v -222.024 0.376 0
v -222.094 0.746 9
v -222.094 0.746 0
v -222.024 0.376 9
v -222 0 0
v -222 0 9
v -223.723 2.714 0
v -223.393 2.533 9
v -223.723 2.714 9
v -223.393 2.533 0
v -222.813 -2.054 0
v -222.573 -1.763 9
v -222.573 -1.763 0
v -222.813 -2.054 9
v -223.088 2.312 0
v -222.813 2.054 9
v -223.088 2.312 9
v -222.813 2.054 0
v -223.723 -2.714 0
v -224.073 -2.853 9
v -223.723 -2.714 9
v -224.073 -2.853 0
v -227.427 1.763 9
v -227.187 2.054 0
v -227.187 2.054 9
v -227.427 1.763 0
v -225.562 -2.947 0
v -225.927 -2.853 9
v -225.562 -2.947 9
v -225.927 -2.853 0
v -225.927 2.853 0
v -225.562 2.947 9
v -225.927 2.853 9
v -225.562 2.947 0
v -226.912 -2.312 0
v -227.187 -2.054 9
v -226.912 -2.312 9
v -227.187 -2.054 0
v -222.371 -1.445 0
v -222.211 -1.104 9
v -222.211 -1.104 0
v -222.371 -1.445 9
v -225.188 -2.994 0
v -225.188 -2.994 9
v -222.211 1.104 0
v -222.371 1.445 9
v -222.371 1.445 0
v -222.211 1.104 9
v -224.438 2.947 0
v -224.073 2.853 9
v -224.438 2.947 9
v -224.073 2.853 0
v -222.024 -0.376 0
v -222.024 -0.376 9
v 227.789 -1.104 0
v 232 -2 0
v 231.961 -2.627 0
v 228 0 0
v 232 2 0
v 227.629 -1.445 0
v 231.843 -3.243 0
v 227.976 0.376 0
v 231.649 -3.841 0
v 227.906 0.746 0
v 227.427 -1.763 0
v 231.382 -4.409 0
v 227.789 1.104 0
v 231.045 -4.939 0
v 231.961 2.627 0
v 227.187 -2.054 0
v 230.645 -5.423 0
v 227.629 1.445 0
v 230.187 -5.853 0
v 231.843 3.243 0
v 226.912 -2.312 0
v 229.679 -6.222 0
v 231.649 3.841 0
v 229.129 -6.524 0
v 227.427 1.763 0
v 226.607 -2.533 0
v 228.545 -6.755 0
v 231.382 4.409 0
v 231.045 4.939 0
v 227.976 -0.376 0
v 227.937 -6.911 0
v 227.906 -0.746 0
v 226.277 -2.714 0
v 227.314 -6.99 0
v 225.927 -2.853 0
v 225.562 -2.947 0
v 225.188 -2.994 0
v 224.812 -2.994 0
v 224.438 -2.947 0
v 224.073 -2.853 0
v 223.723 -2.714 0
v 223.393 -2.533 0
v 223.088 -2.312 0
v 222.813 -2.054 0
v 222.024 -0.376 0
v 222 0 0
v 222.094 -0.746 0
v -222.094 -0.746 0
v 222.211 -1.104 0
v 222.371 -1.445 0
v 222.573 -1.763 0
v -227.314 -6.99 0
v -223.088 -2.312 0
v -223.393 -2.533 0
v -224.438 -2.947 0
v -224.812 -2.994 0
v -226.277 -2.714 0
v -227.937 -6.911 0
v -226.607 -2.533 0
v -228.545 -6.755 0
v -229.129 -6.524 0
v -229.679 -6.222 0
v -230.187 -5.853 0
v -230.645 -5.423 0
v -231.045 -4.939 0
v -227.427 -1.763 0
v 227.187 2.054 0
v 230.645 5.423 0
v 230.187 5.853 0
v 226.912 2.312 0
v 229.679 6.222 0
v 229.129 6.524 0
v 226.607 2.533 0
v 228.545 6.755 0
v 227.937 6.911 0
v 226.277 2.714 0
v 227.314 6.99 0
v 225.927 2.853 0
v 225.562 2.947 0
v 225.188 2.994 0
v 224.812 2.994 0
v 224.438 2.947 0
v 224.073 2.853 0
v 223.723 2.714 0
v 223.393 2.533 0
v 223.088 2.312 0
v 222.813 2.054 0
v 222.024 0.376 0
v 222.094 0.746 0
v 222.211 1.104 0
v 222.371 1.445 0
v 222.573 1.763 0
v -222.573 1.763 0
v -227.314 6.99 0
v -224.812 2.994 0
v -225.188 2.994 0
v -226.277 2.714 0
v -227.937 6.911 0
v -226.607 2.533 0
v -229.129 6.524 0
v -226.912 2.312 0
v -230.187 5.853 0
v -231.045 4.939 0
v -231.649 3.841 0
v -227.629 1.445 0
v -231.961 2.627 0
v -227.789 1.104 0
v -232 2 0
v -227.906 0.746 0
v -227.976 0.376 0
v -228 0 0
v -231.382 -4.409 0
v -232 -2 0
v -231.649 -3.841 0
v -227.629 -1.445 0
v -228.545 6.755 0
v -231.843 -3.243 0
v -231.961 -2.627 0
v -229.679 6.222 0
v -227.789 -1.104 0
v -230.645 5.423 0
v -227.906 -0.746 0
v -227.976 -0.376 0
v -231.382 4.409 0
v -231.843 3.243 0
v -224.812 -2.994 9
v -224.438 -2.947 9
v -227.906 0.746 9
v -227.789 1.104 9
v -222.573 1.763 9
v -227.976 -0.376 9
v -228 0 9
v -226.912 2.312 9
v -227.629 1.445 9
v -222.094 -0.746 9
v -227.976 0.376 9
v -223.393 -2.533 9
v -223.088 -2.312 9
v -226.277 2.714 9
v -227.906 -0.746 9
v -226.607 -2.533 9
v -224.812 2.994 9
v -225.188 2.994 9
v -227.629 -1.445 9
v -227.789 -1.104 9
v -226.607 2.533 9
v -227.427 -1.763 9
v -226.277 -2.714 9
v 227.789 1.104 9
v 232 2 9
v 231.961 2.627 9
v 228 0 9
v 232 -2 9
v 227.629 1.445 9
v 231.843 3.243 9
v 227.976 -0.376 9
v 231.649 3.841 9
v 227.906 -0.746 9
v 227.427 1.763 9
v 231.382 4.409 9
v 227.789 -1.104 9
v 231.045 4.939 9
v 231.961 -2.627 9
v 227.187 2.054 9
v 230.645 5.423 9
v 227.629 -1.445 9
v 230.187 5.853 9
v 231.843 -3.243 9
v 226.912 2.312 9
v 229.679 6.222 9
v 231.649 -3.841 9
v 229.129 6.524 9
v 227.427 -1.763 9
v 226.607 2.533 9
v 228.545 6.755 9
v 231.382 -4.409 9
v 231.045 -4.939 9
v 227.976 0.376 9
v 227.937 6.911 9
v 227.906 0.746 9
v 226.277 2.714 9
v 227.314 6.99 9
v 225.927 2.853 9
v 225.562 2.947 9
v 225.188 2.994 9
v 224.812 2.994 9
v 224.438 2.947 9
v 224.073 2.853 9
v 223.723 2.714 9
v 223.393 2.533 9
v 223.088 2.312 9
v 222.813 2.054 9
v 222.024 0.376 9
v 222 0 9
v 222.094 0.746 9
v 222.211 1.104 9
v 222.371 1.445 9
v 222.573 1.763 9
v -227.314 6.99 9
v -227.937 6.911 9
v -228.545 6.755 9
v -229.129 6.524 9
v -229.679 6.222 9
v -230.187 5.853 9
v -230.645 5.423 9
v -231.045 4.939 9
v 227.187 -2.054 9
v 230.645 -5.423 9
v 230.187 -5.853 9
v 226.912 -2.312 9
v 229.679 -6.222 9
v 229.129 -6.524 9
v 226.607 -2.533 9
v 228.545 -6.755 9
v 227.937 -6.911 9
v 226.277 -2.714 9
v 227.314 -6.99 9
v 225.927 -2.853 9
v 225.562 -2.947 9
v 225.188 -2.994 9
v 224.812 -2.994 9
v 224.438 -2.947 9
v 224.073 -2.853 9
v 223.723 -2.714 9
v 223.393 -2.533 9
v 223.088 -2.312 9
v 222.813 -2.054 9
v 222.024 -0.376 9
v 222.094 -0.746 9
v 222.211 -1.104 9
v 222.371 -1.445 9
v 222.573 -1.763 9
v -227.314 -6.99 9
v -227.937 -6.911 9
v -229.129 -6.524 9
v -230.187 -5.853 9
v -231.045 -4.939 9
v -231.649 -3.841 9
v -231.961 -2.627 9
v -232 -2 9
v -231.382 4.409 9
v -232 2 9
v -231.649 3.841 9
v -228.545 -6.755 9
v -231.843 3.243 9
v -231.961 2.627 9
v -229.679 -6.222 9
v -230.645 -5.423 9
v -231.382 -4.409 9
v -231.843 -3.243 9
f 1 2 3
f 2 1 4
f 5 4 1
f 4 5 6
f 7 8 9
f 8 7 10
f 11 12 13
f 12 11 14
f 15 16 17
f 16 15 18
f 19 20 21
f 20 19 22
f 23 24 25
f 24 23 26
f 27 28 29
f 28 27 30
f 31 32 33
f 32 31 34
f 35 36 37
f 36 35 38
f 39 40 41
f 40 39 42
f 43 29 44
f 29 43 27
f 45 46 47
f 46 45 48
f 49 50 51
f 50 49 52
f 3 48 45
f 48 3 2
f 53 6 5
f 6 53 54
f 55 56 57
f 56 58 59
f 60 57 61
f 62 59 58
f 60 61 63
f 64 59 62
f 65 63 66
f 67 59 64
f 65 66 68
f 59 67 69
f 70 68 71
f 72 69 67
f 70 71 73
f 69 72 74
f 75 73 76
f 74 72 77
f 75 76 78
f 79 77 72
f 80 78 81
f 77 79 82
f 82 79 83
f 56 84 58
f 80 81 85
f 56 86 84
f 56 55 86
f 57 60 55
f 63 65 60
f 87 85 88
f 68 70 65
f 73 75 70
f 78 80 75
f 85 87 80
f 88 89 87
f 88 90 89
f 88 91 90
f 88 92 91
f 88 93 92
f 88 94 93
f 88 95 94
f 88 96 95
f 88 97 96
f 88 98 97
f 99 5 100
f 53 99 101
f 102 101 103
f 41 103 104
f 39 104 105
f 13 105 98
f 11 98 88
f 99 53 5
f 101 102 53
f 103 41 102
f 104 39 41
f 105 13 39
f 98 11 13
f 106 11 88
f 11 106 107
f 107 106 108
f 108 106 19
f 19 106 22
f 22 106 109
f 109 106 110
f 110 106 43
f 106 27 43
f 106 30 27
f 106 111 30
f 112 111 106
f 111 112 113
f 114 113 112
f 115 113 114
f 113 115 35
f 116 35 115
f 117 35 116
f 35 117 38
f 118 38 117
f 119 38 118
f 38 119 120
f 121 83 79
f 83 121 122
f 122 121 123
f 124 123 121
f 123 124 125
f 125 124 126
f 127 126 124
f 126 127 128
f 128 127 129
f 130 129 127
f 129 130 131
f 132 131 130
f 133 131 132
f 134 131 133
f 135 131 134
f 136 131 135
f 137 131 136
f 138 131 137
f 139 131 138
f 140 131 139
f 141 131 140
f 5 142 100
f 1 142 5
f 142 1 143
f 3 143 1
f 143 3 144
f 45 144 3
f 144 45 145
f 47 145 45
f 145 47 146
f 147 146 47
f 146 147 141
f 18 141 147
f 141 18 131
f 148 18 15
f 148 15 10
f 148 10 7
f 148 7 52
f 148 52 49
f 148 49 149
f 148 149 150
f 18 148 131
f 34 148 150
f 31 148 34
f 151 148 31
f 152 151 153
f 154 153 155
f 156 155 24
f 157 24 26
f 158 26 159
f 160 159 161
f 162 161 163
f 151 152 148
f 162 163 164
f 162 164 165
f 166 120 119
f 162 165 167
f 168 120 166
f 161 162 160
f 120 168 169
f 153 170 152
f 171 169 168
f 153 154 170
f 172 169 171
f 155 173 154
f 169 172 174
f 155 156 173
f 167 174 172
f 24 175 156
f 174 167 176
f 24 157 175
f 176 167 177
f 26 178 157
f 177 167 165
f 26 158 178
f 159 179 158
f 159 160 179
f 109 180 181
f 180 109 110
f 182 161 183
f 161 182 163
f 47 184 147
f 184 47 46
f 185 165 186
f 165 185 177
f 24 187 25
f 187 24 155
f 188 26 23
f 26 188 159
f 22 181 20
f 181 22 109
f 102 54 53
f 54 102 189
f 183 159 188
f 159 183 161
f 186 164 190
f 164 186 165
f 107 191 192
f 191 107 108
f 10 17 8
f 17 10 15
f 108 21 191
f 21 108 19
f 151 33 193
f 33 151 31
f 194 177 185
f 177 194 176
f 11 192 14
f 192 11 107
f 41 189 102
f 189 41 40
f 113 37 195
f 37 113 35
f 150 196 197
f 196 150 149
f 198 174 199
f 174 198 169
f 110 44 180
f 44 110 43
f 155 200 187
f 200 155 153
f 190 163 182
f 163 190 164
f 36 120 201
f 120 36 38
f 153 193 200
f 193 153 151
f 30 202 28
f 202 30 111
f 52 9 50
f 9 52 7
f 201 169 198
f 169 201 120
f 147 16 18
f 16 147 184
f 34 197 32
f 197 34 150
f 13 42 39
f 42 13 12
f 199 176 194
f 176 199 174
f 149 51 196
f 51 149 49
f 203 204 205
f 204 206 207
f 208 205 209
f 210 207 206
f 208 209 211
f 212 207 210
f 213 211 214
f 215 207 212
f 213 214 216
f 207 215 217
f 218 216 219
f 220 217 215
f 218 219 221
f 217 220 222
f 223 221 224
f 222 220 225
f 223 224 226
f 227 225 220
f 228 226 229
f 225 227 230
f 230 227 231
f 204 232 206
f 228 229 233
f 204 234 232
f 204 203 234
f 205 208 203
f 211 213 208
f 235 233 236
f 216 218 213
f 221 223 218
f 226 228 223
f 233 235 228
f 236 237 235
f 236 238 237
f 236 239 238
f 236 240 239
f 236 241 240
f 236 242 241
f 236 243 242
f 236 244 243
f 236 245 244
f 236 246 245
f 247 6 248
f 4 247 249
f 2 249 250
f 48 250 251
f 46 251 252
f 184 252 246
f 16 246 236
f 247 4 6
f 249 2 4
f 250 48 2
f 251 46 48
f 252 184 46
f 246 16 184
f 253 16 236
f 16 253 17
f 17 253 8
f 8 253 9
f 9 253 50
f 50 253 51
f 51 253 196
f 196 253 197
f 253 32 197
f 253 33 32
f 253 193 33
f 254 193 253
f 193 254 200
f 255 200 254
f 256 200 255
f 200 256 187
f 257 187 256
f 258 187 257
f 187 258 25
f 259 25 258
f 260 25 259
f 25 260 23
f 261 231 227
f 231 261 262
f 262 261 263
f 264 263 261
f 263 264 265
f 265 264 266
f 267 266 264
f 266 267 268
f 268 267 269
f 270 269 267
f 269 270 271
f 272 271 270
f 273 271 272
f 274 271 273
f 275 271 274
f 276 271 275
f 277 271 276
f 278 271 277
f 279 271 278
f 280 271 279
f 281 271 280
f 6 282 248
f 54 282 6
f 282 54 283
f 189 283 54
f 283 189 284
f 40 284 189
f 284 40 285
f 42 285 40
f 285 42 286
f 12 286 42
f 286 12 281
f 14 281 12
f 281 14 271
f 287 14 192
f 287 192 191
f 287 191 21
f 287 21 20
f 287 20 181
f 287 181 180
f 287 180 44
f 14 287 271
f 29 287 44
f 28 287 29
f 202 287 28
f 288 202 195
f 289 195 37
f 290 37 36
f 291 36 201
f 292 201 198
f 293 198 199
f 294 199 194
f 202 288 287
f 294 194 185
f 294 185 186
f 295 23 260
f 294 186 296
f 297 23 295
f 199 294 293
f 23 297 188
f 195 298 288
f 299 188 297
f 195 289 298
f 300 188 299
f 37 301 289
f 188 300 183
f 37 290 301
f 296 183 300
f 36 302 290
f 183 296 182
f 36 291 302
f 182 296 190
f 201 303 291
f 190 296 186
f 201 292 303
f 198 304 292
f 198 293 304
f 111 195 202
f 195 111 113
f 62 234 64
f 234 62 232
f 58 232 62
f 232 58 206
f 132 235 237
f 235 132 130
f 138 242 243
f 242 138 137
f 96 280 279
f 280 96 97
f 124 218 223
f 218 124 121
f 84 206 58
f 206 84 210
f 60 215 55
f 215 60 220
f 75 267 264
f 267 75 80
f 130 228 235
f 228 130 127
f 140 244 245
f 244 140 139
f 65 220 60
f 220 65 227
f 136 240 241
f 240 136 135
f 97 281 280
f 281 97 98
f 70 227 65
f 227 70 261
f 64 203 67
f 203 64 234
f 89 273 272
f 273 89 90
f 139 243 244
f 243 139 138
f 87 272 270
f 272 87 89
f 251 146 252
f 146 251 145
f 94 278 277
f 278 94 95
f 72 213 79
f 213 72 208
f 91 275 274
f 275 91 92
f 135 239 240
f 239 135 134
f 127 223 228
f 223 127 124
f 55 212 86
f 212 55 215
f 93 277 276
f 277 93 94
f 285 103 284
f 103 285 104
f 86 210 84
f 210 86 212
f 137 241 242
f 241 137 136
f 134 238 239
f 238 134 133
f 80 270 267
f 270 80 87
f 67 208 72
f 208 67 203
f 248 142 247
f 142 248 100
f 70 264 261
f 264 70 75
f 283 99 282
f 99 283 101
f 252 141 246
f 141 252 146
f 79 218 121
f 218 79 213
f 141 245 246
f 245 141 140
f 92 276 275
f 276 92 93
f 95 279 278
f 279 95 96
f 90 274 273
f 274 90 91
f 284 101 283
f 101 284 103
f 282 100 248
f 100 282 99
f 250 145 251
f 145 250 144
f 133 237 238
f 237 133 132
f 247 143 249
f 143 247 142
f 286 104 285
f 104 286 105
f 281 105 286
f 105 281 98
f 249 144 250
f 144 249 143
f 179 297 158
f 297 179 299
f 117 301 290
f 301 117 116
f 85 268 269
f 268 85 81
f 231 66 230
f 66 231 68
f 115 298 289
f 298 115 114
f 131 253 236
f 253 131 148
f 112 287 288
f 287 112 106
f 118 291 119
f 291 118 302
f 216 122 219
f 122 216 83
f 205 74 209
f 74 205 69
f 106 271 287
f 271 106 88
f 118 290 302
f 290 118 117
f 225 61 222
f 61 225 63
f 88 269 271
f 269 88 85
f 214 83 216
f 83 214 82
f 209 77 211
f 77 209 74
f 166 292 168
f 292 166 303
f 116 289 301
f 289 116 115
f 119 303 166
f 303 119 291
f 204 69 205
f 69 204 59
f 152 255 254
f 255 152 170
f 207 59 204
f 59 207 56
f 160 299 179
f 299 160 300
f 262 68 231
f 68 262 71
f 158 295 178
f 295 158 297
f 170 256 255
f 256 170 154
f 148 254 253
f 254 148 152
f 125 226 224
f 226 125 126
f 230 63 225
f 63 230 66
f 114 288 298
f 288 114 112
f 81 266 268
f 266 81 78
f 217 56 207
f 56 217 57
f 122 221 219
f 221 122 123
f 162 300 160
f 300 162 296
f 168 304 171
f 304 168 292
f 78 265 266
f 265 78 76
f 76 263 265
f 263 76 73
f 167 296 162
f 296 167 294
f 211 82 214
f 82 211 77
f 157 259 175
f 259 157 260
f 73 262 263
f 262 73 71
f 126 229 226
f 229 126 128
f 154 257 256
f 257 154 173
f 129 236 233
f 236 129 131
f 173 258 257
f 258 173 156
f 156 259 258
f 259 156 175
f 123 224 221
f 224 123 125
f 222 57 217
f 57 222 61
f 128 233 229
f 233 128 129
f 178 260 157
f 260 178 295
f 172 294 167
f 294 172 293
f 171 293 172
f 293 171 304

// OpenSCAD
$fn = 50;


difference() {
	union() {
		hull() {
			translate(v = [-227.0000000000, 2.0000000000, 0]) {
				cylinder(h = 9, r = 5);
			}
			translate(v = [227.0000000000, 2.0000000000, 0]) {
				cylinder(h = 9, r = 5);
			}
			translate(v = [-227.0000000000, -2.0000000000, 0]) {
				cylinder(h = 9, r = 5);
			}
			translate(v = [227.0000000000, -2.0000000000, 0]) {
				cylinder(h = 9, r = 5);
			}
		}
	}
	union() {
		translate(v = [-225.0000000000, 0.0000000000, 0]) {
			cylinder(h = 9, r = 3.0000000000);
		}
		translate(v = [225.0000000000, 0.0000000000, 0]) {
			cylinder(h = 9, r = 3.0000000000);
		}
		translate(v = [-225.0000000000, 0.0000000000, 0]) {
			cylinder(h = 9, r = 1.5000000000);
		}
		translate(v = [225.0000000000, 0.0000000000, 0]) {
			cylinder(h = 9, r = 1.5000000000);
		}
		translate(v = [-225.0000000000, 0.0000000000, 0]) {
			cylinder(h = 9, r = 1.5000000000);
		}
		translate(v = [225.0000000000, 0.0000000000, 0]) {
			cylinder(h = 9, r = 1.5000000000);
		}
		translate(v = [-225.0000000000, 0.0000000000, 0]) {
			cylinder(h = 9, r = 1.5000000000);
		}
		translate(v = [225.0000000000, 0.0000000000, 0]) {
			cylinder(h = 9, r = 1.5000000000);
		}
	}
}
